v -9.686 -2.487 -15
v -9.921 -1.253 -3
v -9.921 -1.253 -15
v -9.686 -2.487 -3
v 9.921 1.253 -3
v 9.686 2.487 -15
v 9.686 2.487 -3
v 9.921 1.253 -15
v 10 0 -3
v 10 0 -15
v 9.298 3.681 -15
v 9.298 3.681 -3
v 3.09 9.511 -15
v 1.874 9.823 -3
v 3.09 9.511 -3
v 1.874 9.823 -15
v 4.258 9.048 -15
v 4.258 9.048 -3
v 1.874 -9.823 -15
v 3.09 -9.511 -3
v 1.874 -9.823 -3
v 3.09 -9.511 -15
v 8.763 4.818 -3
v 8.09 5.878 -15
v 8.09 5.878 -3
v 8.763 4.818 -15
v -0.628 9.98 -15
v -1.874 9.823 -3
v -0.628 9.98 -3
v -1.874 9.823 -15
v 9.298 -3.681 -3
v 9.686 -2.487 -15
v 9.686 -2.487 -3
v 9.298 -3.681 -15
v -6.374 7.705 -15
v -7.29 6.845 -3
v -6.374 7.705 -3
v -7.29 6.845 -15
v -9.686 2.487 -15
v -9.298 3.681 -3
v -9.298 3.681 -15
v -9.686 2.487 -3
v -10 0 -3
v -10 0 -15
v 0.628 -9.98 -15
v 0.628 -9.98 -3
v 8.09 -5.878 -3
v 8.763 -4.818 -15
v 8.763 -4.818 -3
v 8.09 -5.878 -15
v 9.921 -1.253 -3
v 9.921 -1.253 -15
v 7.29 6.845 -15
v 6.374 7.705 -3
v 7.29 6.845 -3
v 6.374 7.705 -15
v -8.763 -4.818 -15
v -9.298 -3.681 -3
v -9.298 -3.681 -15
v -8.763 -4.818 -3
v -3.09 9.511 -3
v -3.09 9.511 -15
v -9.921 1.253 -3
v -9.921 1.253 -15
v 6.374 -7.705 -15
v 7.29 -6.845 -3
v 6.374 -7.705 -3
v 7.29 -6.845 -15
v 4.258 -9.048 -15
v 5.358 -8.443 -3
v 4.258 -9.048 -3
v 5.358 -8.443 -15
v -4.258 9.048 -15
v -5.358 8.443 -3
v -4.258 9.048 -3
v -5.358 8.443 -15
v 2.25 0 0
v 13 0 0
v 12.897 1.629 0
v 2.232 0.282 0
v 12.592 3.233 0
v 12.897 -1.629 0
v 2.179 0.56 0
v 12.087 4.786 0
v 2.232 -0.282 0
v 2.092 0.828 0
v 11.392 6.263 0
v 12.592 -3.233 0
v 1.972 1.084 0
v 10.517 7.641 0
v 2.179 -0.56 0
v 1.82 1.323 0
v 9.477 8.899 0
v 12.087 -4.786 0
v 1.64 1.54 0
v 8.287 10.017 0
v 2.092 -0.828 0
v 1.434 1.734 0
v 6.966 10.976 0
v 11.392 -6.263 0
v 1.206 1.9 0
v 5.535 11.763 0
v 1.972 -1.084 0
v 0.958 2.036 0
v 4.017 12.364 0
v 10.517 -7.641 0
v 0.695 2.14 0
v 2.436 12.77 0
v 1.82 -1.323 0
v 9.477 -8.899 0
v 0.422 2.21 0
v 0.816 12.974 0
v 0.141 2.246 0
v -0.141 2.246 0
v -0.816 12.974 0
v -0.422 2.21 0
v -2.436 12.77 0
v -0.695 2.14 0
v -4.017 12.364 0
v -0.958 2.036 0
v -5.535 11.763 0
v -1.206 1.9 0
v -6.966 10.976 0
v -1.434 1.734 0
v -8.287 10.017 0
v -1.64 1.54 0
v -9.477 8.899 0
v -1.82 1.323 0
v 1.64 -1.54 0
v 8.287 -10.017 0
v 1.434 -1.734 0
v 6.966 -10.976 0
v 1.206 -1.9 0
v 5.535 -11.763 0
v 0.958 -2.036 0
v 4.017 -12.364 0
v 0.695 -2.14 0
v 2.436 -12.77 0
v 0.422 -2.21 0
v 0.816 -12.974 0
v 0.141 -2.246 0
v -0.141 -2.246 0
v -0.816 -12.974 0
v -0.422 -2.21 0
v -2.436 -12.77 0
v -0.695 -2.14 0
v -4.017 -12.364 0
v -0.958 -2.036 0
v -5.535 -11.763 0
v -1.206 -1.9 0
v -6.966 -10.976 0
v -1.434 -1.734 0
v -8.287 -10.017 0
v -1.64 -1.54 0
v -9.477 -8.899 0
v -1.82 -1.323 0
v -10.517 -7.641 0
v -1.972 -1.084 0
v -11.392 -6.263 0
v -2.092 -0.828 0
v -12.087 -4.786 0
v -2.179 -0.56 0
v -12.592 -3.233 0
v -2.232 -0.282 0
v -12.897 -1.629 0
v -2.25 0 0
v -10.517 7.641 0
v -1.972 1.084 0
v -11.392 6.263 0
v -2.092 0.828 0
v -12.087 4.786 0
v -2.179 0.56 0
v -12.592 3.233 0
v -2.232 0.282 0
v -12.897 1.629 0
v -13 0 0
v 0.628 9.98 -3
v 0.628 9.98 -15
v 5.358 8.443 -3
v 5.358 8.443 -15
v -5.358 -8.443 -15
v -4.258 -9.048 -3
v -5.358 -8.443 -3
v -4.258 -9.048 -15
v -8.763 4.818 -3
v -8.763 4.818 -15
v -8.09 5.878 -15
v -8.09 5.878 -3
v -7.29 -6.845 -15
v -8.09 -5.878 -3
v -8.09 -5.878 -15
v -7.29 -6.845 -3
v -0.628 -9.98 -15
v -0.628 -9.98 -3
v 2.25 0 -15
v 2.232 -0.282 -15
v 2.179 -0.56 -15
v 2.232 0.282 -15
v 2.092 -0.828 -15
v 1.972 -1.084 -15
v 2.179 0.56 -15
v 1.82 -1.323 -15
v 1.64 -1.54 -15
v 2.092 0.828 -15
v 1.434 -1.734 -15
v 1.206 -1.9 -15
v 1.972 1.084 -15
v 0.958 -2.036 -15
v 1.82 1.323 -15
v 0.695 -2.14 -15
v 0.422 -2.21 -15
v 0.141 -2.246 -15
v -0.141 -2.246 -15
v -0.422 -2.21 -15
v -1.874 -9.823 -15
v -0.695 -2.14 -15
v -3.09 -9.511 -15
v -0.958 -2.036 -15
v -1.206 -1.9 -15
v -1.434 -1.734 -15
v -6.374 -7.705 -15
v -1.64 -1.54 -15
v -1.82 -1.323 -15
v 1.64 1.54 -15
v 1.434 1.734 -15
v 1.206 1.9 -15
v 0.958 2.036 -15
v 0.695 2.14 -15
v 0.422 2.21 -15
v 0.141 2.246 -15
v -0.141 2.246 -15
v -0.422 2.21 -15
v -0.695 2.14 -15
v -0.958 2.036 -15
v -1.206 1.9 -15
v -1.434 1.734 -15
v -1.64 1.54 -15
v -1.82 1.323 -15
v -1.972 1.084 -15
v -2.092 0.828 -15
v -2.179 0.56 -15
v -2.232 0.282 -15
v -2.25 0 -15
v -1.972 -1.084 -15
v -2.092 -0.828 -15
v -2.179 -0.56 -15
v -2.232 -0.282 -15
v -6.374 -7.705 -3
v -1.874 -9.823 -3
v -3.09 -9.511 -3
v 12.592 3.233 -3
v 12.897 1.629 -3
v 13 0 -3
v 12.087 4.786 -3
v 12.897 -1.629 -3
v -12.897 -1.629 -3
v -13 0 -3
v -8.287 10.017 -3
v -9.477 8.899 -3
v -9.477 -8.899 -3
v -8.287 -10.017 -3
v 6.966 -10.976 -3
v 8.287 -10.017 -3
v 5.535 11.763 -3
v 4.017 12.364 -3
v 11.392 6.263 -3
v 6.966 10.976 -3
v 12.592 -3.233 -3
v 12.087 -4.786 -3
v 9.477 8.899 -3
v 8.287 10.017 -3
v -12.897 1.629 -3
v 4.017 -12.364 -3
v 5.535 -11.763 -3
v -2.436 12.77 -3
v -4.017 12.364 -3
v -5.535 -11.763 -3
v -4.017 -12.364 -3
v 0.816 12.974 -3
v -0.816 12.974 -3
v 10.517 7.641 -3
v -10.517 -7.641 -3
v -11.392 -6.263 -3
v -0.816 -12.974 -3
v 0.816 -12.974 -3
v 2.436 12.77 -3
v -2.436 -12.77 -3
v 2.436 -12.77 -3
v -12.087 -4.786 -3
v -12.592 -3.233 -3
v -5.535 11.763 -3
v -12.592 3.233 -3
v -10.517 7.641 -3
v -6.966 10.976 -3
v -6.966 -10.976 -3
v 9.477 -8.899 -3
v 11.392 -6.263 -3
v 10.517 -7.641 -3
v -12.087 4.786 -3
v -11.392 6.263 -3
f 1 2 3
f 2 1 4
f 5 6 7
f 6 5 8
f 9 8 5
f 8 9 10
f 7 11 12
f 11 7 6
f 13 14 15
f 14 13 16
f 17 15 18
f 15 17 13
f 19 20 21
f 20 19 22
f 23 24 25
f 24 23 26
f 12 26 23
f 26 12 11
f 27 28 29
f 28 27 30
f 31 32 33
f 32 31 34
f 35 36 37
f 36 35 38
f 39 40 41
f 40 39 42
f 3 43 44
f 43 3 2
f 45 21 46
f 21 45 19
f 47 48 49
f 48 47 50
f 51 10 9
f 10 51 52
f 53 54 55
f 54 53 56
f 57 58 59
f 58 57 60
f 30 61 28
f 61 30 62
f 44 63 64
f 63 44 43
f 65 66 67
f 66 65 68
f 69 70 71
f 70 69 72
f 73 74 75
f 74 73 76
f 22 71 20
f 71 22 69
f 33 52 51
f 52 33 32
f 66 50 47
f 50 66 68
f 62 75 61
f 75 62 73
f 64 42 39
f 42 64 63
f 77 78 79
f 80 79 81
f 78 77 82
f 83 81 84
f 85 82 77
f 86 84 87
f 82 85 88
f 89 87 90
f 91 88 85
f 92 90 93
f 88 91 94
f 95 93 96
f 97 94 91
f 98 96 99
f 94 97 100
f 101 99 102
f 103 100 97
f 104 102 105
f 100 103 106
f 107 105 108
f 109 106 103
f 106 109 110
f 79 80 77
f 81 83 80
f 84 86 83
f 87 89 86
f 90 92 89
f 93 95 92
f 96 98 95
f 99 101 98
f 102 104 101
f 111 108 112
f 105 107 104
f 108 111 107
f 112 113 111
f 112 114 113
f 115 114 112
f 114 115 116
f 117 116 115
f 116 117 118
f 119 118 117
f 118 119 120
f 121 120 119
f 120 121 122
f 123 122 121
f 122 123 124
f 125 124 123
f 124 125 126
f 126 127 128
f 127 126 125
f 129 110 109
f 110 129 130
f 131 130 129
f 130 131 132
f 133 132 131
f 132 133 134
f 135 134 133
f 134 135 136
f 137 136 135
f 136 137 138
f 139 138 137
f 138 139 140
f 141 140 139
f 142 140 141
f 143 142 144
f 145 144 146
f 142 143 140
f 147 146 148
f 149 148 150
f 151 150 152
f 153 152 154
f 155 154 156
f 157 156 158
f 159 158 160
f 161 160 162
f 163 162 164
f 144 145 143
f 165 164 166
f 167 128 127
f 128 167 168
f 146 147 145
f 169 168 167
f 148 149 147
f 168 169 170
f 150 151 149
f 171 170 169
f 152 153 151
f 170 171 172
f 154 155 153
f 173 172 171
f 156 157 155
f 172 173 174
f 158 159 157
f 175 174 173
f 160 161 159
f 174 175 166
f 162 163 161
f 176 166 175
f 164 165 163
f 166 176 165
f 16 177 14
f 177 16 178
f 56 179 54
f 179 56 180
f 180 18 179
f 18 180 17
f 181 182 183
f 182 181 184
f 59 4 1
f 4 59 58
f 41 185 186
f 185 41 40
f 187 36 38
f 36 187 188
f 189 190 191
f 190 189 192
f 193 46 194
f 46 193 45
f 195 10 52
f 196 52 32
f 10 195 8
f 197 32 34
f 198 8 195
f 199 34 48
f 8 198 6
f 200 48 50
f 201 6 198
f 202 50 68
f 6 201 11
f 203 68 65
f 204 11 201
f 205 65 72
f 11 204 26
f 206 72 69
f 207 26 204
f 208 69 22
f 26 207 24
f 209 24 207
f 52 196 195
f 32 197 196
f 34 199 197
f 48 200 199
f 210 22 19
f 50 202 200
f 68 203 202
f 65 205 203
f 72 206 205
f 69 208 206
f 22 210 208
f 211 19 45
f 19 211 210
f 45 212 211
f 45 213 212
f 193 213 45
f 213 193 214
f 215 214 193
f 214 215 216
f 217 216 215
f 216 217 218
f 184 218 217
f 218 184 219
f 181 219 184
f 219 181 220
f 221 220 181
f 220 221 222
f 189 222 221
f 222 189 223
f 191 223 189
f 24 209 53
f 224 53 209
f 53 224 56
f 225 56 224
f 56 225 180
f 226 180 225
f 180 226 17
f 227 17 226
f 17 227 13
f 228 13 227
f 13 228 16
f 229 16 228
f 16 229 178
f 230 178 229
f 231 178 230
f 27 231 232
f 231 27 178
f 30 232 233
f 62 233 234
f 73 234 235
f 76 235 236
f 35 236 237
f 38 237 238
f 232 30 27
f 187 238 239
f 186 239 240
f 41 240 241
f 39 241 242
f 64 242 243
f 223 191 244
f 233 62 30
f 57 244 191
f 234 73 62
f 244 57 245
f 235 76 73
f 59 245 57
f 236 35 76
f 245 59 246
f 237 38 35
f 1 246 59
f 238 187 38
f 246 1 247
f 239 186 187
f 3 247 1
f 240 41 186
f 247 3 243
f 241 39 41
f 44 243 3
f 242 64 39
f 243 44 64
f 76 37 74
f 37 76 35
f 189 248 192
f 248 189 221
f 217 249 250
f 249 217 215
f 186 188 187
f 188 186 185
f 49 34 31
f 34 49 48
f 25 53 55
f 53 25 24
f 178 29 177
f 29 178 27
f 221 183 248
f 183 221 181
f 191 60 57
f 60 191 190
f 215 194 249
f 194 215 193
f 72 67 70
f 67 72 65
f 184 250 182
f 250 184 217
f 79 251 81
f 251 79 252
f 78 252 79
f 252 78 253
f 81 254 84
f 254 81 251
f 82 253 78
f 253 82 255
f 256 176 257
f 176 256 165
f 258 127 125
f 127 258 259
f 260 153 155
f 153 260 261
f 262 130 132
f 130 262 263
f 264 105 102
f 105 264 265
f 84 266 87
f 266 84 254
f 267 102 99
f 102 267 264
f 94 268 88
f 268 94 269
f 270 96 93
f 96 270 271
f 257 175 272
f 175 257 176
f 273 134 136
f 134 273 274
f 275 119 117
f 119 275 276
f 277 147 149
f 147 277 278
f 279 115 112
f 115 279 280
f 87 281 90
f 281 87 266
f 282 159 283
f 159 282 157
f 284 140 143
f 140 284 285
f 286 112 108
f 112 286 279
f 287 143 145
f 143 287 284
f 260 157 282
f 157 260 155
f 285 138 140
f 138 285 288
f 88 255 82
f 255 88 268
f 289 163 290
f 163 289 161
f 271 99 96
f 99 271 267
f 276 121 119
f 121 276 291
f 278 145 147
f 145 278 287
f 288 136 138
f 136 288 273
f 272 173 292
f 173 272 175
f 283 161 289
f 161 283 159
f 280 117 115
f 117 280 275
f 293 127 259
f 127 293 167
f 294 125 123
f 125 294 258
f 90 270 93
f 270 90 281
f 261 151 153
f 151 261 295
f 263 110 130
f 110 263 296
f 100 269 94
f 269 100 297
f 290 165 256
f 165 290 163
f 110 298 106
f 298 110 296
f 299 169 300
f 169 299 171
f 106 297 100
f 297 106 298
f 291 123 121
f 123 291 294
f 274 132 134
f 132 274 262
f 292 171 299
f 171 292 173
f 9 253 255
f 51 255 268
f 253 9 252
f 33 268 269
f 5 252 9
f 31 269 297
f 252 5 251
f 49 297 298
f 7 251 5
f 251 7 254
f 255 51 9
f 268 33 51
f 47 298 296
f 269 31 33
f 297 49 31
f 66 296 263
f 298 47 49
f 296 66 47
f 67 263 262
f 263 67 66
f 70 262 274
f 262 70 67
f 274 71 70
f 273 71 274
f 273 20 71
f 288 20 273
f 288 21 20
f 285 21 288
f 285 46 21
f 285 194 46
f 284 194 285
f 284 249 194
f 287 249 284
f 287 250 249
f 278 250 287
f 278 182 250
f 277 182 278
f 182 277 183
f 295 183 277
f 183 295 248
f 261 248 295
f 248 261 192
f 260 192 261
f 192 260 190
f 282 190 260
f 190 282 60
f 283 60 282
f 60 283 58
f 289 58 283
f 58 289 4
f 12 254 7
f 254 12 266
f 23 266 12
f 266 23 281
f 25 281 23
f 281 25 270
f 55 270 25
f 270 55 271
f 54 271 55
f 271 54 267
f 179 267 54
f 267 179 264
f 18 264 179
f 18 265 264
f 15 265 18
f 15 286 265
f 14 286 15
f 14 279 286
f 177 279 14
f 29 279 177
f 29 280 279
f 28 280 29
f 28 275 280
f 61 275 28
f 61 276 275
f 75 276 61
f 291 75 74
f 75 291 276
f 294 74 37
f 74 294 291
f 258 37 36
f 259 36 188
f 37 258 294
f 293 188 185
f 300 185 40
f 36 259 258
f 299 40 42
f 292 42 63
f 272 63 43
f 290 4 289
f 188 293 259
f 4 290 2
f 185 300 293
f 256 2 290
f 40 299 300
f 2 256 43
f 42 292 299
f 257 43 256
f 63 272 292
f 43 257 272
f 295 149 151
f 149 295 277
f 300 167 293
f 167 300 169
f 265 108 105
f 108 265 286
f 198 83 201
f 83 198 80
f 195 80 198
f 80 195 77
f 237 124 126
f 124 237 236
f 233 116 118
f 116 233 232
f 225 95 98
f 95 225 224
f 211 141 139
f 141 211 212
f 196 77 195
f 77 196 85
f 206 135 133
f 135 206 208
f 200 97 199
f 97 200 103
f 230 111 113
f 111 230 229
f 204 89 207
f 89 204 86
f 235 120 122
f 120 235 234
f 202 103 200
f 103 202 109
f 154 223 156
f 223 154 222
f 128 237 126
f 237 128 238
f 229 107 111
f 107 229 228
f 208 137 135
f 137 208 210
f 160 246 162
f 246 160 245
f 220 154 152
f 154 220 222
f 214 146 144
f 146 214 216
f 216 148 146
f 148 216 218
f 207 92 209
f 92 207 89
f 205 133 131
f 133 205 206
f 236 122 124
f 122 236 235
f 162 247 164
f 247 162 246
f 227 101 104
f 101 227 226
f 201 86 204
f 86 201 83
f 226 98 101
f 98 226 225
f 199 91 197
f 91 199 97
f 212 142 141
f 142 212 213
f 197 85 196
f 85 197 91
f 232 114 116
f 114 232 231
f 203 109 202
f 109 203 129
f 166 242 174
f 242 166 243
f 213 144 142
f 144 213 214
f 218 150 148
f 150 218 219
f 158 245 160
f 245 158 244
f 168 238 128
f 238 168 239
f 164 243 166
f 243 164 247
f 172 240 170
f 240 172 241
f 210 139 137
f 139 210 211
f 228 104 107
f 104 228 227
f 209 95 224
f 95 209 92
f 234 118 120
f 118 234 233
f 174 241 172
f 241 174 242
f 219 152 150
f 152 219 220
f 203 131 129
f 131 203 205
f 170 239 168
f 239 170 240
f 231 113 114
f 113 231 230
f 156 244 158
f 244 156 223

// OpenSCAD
$fn = 50;


difference() {
	union() {
		translate(v = [0, 0, -15.0000000000]) {
			cylinder(h = 15, r = 10.0000000000);
		}
		translate(v = [0, 0, -3.0000000000]) {
			cylinder(h = 3, r = 13.0000000000);
		}
	}
	union() {
		#translate(v = [0, 0, -15]) {
			cylinder(h = 15, r = 2.2500000000);
		}
	}
}
